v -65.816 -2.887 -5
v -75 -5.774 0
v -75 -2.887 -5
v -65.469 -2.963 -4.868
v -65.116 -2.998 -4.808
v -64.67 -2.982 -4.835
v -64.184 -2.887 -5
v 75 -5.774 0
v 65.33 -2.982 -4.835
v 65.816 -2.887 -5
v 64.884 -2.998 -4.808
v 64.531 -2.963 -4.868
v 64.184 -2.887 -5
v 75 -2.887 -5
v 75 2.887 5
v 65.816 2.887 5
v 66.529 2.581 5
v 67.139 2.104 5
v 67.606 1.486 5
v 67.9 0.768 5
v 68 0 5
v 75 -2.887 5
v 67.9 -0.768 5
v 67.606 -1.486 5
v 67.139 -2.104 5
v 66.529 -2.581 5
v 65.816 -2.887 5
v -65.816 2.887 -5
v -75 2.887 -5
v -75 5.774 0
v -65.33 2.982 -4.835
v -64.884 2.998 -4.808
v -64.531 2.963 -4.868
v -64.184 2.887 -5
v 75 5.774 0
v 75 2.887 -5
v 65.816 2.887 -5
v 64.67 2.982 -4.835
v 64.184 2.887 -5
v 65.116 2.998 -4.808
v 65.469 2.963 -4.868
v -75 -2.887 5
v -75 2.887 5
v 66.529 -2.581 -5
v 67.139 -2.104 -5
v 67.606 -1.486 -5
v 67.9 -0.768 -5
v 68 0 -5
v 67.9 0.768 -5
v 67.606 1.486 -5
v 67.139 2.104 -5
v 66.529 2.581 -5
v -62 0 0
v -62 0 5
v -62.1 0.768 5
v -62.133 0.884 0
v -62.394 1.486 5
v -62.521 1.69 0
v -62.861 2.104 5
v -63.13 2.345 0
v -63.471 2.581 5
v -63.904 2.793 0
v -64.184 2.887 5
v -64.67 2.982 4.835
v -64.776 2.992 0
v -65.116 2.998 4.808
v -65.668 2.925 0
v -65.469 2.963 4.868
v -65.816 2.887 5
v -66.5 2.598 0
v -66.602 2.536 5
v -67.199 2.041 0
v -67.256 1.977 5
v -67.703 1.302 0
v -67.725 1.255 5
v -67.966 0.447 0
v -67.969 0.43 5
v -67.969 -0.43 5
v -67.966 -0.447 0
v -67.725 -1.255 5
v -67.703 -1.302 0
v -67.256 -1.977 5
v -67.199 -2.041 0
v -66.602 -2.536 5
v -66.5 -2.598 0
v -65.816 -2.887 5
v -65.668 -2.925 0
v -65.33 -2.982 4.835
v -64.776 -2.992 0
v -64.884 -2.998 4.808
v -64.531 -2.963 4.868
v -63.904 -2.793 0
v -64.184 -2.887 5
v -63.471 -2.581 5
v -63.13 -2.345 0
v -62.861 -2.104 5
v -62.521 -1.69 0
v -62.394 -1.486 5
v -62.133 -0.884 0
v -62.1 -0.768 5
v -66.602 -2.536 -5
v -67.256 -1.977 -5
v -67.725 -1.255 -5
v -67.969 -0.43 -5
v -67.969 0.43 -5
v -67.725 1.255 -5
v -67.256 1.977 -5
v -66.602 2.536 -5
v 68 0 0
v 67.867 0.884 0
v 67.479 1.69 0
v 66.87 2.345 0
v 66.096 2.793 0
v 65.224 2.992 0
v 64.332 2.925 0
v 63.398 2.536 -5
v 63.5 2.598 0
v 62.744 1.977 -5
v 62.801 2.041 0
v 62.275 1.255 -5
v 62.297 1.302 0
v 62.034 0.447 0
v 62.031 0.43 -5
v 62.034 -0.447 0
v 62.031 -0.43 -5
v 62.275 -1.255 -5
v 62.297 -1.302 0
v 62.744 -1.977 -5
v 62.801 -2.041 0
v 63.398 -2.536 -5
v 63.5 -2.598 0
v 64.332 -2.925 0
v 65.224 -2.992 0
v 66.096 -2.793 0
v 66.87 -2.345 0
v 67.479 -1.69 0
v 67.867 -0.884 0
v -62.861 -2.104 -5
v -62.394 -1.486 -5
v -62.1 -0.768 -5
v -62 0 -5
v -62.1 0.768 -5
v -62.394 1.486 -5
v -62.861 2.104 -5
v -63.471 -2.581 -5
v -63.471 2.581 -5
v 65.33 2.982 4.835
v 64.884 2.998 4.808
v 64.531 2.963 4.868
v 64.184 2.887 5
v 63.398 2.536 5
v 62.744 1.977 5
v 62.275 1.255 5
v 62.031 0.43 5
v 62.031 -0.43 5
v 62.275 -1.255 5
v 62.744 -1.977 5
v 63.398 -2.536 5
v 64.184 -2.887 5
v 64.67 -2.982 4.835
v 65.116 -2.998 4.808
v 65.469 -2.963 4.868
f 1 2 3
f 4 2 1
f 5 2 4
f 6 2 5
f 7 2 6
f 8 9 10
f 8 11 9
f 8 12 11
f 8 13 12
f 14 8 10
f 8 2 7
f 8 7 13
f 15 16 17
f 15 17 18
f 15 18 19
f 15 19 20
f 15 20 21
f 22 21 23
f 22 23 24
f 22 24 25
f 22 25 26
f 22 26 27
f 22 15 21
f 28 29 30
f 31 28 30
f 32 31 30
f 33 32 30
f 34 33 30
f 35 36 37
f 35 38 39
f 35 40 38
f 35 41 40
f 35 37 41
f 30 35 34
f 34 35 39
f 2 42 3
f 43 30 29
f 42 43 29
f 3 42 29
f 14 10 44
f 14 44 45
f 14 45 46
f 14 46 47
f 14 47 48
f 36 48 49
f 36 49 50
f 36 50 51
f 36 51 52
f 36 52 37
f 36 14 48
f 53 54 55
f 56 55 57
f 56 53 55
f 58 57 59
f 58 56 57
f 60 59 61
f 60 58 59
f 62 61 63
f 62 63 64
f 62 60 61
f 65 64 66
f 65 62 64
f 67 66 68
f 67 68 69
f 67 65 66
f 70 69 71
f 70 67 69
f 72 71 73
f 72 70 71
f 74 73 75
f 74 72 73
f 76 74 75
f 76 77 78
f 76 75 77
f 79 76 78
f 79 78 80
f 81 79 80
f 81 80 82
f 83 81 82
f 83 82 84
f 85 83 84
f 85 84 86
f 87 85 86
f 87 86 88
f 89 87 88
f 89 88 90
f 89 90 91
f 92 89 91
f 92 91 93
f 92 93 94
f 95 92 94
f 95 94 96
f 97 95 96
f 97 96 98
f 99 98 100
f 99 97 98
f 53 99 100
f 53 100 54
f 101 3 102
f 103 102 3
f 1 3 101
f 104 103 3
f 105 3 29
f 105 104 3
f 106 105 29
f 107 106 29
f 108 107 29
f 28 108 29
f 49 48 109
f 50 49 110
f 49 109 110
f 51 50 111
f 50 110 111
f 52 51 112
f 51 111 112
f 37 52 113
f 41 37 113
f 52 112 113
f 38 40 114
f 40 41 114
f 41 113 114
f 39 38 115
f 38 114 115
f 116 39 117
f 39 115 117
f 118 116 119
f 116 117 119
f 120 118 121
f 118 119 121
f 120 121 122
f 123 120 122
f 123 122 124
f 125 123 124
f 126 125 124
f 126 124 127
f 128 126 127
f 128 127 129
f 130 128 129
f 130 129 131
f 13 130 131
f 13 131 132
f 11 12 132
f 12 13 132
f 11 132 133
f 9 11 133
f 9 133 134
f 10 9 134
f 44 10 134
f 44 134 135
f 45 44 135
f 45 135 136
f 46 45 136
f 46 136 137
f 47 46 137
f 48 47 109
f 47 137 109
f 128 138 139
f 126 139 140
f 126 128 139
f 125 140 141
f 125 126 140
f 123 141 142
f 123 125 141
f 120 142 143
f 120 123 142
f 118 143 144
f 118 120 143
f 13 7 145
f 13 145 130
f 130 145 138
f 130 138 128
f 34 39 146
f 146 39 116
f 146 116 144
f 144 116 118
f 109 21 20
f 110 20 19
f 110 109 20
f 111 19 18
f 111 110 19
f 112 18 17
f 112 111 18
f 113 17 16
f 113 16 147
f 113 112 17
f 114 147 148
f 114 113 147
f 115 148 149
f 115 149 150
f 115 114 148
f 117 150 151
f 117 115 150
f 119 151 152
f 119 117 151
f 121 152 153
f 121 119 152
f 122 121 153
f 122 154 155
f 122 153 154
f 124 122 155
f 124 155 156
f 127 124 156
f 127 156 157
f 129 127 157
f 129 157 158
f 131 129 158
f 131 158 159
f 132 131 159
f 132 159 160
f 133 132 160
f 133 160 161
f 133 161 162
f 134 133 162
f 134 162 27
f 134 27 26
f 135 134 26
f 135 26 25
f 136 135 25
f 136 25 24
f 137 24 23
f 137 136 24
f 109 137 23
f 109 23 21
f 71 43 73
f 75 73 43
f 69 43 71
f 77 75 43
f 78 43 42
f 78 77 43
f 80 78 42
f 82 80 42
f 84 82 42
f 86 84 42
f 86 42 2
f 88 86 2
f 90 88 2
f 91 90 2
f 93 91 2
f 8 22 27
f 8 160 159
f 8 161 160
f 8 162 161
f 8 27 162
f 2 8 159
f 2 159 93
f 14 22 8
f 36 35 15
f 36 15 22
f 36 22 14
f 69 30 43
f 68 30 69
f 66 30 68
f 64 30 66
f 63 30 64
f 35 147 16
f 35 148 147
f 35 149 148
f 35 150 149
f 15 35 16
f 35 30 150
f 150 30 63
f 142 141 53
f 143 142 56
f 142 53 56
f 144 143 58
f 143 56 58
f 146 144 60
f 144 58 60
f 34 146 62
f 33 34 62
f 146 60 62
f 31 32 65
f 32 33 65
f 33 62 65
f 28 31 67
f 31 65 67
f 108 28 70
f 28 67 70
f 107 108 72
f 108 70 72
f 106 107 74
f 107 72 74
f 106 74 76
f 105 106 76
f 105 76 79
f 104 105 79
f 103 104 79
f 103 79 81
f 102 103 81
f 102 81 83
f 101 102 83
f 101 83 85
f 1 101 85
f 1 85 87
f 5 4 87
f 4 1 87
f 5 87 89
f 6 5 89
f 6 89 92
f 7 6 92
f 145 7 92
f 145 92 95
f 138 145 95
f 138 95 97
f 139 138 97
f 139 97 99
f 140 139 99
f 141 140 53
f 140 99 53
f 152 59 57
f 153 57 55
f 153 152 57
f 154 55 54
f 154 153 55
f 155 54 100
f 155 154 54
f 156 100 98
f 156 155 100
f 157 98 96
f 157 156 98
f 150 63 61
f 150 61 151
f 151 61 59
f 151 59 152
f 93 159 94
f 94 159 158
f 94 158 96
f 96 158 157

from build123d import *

# Parameters (mm, degrees)
BOSS_EXTRUDE1_DEPTH     = 75
SKETCH2_R               = 3
CUT_EXTRUDE1_DEPTH      = 6
CUT_EXTRUDE1_DEPTH_BACK = 6


with BuildPart() as part:
    # Sketch1 → Boss-Extrude1 (new body, symmetric)
    with BuildSketch(Plane(origin=(0, 0, 0), x_dir=(0, 0, -1), z_dir=(1, 0, 0))):
        Polygon((0, 5.773502692), (-5, 2.886751346), (-5, -2.886751346), (0, -5.773502692), (5, -2.886751346), (5, 2.886751346), align=None)
    extrude(amount=BOSS_EXTRUDE1_DEPTH, both=True)

    # Sketch2 → Cut-Extrude1 (cut, two sides)
    with BuildSketch(Plane.XY) as cut_extrude1_sk:
        with Locations((65, 0)):
            Circle(SKETCH2_R)
        with Locations((-65, 0)):
            Circle(SKETCH2_R)
    extrude(amount=CUT_EXTRUDE1_DEPTH, mode=Mode.SUBTRACT)
    extrude(cut_extrude1_sk.sketch, amount=-CUT_EXTRUDE1_DEPTH_BACK, mode=Mode.SUBTRACT)


solid = part.part
